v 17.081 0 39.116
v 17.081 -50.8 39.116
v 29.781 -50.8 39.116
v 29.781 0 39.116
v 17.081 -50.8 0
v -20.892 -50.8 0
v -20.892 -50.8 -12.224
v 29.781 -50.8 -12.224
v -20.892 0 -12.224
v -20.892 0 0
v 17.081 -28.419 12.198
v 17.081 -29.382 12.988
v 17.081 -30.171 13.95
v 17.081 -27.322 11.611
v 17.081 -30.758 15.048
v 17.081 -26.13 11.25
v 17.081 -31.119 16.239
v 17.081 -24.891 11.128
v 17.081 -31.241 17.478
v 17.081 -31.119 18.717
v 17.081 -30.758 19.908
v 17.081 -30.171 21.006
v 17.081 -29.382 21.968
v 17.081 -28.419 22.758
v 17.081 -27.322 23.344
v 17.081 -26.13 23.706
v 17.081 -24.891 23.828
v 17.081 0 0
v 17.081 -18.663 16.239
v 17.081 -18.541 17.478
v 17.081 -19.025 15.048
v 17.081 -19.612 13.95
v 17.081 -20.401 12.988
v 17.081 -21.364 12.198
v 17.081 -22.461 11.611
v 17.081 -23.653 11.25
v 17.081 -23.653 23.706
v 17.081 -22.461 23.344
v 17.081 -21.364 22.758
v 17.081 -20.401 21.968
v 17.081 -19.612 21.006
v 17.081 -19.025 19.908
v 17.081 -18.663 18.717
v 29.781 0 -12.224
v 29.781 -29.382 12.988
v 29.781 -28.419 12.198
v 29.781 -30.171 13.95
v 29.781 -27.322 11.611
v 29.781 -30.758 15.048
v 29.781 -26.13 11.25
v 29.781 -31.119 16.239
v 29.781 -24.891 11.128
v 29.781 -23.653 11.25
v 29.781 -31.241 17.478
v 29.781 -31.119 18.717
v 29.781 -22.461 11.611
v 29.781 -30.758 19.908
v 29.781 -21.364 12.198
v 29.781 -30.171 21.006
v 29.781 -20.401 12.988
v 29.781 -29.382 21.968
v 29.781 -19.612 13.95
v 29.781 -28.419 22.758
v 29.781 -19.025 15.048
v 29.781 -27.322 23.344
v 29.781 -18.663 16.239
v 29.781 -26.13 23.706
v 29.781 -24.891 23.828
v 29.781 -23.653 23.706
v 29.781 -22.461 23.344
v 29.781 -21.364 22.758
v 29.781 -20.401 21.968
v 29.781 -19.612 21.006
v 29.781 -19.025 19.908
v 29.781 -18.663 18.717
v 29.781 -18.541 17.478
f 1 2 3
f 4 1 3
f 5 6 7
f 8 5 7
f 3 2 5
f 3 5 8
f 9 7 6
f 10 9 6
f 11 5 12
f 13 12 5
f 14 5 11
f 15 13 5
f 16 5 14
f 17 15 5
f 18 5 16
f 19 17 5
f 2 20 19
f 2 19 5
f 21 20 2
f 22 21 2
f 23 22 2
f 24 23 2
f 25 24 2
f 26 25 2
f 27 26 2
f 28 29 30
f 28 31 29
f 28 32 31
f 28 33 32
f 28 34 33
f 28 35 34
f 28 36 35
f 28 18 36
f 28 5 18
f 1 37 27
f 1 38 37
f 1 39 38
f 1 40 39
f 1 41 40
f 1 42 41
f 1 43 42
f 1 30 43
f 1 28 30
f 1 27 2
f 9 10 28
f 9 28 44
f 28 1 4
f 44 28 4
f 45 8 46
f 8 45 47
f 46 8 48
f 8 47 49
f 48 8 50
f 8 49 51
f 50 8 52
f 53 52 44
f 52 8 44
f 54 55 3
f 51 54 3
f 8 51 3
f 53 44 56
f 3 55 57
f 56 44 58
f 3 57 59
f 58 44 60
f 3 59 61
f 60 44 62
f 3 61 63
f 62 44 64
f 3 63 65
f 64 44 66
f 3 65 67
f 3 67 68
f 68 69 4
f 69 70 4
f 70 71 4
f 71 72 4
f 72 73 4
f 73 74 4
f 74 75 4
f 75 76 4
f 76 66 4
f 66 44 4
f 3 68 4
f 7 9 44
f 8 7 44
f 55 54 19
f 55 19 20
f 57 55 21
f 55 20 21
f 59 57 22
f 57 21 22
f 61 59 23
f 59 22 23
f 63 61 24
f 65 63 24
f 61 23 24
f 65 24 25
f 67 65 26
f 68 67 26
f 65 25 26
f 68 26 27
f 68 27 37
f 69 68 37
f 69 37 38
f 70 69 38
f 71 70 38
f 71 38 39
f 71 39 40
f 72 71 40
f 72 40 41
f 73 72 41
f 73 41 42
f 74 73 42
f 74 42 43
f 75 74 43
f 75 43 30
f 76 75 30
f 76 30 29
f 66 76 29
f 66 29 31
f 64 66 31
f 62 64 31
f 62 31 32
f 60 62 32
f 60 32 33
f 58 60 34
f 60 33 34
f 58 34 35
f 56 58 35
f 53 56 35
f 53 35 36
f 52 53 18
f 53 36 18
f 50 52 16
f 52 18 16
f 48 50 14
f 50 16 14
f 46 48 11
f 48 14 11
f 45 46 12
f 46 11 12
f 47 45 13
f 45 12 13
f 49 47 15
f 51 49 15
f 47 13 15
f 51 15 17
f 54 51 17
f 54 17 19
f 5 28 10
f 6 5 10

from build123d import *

# Parameters (mm, degrees)
F0_W     = 50.6729986519
F0_H     = 51.3397492468
F1_DEPTH = 50.8
F2_W     = 37.9729986519
F2_H     = 39.115998894
F5_DEPTH = 25.4
F6_DEPTH = 25.4
F7_R     = 6.35
F8_DEPTH = 25.4


with BuildPart() as f1:
    # F0 (on Front) → F1 (new body)
    with BuildSketch(Plane.XZ):
        with Locations((4.444998689, 13.4461242706)):
            Rectangle(F0_W, F0_H)
    extrude(amount=F1_DEPTH)

    # F2 (on face) → F5 (cut)
    with BuildSketch(Plane(origin=(0, 0, 0), x_dir=(-1, 0, 0), z_dir=(0, 1, 0))):
        with Locations((1.905001311, 19.557999447)):
            Rectangle(F2_W, F2_H)
    extrude(amount=-F5_DEPTH, mode=Mode.SUBTRACT)

    # F6 (cut): a face of the model
    f6_faces = [f1.faces().sort_by_distance(p)[0] for p in [
        (-1.905001311, -25.4, 19.557999447),
    ]]
    extrude(f6_faces, amount=-F6_DEPTH, mode=Mode.SUBTRACT)

    # F7 (on face) → F8 (cut)
    with BuildSketch(Plane(origin=(17.0814980149, 0, 0), x_dir=(0, -1, 0), z_dir=(-1, 0, 0))):
        with Locations((24.8914603144, 17.4777153879)):
            Circle(F7_R)
    extrude(amount=-F8_DEPTH, mode=Mode.SUBTRACT)


solid = f1.part
